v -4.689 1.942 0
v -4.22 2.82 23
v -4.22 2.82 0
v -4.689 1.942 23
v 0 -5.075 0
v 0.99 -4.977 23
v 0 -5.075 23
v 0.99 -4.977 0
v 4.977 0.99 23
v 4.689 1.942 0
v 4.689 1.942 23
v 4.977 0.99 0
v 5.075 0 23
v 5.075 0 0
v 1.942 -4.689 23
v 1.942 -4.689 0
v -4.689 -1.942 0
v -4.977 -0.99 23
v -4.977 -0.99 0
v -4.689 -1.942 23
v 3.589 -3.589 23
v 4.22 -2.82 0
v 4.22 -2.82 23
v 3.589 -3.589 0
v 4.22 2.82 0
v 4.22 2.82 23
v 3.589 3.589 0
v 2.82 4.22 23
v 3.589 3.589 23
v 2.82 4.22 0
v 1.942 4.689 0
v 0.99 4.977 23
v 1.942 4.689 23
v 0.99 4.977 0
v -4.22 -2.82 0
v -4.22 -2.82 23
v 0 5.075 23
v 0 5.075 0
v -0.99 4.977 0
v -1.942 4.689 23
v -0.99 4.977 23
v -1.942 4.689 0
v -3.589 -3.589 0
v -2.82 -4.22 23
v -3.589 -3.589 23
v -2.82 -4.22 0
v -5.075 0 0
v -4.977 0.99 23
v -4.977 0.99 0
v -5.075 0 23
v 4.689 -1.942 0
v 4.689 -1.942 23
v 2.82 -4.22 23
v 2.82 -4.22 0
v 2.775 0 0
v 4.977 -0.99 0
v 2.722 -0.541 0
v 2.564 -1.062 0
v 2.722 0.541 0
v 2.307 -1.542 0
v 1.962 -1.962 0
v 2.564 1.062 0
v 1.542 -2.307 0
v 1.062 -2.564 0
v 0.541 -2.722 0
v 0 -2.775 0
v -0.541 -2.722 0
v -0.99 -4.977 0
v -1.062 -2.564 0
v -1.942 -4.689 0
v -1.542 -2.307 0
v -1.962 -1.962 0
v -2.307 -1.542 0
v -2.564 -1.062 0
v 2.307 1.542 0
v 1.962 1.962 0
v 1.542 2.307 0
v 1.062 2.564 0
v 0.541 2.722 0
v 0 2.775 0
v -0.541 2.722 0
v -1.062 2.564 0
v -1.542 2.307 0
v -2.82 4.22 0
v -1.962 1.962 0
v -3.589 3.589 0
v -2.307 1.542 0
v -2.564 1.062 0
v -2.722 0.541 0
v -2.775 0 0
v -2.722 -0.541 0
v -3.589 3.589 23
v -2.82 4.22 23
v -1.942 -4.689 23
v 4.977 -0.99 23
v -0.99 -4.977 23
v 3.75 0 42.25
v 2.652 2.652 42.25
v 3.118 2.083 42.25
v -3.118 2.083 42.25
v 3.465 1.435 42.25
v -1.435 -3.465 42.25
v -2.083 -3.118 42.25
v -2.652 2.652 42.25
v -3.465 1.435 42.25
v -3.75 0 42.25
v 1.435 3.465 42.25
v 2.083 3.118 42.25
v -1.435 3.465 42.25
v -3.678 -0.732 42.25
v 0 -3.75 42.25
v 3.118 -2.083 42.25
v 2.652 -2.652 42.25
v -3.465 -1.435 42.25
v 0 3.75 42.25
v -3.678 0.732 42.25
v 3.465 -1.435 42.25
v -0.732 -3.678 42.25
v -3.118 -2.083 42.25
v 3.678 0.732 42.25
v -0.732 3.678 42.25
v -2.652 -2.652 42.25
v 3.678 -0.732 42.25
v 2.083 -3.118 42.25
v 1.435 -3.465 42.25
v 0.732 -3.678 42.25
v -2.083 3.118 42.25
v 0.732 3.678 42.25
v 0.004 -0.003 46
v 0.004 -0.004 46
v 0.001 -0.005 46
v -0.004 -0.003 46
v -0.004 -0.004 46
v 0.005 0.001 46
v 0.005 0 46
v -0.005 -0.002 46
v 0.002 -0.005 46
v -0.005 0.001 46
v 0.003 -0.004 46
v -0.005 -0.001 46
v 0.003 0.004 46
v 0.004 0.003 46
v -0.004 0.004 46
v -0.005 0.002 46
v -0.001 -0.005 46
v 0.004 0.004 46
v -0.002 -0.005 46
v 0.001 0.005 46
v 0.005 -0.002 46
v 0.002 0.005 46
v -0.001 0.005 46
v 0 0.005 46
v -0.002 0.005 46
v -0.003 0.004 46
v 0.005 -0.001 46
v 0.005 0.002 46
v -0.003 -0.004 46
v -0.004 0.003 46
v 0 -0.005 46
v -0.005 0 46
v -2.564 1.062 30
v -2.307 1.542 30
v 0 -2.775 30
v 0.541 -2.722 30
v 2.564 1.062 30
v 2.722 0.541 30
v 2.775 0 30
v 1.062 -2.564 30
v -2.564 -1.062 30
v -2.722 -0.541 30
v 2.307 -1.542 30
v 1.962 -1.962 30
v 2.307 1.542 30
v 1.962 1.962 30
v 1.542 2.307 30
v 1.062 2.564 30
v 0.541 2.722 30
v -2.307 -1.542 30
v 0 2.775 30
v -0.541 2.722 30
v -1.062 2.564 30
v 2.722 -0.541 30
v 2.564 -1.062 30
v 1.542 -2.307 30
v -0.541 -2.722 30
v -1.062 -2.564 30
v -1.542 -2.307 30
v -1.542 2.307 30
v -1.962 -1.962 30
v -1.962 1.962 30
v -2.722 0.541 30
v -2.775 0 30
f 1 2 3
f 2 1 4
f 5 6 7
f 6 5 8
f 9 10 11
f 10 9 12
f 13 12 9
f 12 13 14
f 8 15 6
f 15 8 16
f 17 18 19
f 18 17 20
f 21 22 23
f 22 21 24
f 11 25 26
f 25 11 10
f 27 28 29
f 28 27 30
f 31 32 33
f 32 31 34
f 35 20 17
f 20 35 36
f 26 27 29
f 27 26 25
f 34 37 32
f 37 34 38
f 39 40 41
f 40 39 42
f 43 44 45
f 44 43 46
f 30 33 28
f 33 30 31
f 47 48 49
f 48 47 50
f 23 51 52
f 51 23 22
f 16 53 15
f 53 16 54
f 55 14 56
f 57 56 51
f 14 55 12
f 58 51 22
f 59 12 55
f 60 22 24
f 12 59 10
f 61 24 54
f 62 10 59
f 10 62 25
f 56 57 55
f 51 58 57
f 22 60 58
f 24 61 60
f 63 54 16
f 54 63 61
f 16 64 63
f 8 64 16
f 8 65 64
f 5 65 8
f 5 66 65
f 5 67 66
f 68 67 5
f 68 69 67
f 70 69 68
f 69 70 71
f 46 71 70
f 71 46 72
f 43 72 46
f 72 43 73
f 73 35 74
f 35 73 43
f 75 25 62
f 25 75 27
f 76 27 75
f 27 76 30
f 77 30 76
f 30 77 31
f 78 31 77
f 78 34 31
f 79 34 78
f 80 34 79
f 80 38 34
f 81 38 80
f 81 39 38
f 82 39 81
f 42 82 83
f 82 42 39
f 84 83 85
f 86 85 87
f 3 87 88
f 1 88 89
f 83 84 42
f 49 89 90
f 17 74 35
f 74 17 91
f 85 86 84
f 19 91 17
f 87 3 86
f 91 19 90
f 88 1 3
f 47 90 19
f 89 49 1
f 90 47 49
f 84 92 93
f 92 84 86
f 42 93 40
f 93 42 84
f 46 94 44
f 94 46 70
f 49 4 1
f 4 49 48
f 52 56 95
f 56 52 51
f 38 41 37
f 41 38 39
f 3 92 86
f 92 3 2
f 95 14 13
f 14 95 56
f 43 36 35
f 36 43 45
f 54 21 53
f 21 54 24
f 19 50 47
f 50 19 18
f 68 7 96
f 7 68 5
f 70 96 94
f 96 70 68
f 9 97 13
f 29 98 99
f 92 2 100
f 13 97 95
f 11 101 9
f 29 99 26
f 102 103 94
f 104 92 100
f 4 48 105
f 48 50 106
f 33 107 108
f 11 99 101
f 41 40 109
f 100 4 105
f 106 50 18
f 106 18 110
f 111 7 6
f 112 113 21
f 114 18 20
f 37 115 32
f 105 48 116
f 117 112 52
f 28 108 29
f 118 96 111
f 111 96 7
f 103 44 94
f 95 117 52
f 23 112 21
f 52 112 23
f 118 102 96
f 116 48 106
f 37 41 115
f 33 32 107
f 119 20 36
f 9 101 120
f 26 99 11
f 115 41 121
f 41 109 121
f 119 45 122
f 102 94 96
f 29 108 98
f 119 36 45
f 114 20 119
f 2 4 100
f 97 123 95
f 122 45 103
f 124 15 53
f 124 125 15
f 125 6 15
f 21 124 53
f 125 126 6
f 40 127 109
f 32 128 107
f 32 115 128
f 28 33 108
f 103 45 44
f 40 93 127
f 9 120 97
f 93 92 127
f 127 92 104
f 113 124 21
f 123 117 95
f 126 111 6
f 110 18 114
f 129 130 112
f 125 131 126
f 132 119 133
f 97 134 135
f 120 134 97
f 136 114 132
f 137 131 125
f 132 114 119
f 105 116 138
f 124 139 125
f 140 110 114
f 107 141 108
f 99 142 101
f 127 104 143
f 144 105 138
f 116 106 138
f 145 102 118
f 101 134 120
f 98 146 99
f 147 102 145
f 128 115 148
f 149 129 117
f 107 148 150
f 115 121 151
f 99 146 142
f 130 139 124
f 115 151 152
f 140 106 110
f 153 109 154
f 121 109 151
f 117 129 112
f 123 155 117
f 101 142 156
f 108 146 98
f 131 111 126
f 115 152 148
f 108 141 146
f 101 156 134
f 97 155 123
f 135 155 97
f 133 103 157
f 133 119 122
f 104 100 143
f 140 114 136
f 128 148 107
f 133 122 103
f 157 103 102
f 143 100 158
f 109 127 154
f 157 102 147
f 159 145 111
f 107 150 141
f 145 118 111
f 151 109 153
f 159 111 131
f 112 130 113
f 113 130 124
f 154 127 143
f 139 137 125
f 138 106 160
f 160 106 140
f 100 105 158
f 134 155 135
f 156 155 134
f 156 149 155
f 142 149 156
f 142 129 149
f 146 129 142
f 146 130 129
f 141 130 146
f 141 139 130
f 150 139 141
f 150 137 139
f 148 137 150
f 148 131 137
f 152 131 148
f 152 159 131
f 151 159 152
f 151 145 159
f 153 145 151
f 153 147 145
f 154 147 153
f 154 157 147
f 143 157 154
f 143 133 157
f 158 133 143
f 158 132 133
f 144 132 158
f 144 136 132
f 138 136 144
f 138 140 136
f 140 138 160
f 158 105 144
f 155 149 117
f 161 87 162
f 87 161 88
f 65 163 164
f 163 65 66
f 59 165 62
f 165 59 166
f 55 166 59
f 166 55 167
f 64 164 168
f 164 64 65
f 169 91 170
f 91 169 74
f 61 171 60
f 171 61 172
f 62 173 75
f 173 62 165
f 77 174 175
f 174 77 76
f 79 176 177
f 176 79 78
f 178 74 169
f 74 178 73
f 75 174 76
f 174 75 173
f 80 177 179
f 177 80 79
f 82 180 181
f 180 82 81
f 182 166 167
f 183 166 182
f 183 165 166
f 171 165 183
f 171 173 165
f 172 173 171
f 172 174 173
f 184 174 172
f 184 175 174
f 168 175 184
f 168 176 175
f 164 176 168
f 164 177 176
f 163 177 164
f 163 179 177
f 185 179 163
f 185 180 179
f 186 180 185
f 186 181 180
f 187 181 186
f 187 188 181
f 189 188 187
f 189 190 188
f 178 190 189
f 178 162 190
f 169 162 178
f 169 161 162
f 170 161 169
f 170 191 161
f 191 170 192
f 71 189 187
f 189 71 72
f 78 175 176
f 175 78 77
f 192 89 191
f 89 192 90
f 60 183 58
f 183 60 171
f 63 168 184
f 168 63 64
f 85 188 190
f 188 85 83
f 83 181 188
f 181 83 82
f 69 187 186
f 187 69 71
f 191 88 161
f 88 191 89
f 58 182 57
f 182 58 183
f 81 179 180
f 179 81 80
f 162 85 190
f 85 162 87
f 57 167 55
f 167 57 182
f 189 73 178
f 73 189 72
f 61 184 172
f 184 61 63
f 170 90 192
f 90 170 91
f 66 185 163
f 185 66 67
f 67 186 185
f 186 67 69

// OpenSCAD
// Example table screw repair

$fn=32;

hole_inner_dia = 5.55;
hole_outer_dia = 10.15;
hole_depth = 46.0;
taper_len = hole_depth/2.0;
taper_dia = 7.5;
screw_hole_depth = 30.0;

difference() {
    union () {
        cylinder(h=hole_depth-taper_len, d=hole_outer_dia);
        translate([0,0,hole_depth-taper_len])
        cylinder(h=taper_len-taper_dia/2, d1=hole_outer_dia, d2=taper_dia);
        translate([0,0,hole_depth-taper_dia/2])
        //sphere(d=taper_dia);
        cylinder(h=taper_dia/2, d1=taper_dia, d2=0.01);
    }
    cylinder(h=screw_hole_depth, d=hole_inner_dia);
}
